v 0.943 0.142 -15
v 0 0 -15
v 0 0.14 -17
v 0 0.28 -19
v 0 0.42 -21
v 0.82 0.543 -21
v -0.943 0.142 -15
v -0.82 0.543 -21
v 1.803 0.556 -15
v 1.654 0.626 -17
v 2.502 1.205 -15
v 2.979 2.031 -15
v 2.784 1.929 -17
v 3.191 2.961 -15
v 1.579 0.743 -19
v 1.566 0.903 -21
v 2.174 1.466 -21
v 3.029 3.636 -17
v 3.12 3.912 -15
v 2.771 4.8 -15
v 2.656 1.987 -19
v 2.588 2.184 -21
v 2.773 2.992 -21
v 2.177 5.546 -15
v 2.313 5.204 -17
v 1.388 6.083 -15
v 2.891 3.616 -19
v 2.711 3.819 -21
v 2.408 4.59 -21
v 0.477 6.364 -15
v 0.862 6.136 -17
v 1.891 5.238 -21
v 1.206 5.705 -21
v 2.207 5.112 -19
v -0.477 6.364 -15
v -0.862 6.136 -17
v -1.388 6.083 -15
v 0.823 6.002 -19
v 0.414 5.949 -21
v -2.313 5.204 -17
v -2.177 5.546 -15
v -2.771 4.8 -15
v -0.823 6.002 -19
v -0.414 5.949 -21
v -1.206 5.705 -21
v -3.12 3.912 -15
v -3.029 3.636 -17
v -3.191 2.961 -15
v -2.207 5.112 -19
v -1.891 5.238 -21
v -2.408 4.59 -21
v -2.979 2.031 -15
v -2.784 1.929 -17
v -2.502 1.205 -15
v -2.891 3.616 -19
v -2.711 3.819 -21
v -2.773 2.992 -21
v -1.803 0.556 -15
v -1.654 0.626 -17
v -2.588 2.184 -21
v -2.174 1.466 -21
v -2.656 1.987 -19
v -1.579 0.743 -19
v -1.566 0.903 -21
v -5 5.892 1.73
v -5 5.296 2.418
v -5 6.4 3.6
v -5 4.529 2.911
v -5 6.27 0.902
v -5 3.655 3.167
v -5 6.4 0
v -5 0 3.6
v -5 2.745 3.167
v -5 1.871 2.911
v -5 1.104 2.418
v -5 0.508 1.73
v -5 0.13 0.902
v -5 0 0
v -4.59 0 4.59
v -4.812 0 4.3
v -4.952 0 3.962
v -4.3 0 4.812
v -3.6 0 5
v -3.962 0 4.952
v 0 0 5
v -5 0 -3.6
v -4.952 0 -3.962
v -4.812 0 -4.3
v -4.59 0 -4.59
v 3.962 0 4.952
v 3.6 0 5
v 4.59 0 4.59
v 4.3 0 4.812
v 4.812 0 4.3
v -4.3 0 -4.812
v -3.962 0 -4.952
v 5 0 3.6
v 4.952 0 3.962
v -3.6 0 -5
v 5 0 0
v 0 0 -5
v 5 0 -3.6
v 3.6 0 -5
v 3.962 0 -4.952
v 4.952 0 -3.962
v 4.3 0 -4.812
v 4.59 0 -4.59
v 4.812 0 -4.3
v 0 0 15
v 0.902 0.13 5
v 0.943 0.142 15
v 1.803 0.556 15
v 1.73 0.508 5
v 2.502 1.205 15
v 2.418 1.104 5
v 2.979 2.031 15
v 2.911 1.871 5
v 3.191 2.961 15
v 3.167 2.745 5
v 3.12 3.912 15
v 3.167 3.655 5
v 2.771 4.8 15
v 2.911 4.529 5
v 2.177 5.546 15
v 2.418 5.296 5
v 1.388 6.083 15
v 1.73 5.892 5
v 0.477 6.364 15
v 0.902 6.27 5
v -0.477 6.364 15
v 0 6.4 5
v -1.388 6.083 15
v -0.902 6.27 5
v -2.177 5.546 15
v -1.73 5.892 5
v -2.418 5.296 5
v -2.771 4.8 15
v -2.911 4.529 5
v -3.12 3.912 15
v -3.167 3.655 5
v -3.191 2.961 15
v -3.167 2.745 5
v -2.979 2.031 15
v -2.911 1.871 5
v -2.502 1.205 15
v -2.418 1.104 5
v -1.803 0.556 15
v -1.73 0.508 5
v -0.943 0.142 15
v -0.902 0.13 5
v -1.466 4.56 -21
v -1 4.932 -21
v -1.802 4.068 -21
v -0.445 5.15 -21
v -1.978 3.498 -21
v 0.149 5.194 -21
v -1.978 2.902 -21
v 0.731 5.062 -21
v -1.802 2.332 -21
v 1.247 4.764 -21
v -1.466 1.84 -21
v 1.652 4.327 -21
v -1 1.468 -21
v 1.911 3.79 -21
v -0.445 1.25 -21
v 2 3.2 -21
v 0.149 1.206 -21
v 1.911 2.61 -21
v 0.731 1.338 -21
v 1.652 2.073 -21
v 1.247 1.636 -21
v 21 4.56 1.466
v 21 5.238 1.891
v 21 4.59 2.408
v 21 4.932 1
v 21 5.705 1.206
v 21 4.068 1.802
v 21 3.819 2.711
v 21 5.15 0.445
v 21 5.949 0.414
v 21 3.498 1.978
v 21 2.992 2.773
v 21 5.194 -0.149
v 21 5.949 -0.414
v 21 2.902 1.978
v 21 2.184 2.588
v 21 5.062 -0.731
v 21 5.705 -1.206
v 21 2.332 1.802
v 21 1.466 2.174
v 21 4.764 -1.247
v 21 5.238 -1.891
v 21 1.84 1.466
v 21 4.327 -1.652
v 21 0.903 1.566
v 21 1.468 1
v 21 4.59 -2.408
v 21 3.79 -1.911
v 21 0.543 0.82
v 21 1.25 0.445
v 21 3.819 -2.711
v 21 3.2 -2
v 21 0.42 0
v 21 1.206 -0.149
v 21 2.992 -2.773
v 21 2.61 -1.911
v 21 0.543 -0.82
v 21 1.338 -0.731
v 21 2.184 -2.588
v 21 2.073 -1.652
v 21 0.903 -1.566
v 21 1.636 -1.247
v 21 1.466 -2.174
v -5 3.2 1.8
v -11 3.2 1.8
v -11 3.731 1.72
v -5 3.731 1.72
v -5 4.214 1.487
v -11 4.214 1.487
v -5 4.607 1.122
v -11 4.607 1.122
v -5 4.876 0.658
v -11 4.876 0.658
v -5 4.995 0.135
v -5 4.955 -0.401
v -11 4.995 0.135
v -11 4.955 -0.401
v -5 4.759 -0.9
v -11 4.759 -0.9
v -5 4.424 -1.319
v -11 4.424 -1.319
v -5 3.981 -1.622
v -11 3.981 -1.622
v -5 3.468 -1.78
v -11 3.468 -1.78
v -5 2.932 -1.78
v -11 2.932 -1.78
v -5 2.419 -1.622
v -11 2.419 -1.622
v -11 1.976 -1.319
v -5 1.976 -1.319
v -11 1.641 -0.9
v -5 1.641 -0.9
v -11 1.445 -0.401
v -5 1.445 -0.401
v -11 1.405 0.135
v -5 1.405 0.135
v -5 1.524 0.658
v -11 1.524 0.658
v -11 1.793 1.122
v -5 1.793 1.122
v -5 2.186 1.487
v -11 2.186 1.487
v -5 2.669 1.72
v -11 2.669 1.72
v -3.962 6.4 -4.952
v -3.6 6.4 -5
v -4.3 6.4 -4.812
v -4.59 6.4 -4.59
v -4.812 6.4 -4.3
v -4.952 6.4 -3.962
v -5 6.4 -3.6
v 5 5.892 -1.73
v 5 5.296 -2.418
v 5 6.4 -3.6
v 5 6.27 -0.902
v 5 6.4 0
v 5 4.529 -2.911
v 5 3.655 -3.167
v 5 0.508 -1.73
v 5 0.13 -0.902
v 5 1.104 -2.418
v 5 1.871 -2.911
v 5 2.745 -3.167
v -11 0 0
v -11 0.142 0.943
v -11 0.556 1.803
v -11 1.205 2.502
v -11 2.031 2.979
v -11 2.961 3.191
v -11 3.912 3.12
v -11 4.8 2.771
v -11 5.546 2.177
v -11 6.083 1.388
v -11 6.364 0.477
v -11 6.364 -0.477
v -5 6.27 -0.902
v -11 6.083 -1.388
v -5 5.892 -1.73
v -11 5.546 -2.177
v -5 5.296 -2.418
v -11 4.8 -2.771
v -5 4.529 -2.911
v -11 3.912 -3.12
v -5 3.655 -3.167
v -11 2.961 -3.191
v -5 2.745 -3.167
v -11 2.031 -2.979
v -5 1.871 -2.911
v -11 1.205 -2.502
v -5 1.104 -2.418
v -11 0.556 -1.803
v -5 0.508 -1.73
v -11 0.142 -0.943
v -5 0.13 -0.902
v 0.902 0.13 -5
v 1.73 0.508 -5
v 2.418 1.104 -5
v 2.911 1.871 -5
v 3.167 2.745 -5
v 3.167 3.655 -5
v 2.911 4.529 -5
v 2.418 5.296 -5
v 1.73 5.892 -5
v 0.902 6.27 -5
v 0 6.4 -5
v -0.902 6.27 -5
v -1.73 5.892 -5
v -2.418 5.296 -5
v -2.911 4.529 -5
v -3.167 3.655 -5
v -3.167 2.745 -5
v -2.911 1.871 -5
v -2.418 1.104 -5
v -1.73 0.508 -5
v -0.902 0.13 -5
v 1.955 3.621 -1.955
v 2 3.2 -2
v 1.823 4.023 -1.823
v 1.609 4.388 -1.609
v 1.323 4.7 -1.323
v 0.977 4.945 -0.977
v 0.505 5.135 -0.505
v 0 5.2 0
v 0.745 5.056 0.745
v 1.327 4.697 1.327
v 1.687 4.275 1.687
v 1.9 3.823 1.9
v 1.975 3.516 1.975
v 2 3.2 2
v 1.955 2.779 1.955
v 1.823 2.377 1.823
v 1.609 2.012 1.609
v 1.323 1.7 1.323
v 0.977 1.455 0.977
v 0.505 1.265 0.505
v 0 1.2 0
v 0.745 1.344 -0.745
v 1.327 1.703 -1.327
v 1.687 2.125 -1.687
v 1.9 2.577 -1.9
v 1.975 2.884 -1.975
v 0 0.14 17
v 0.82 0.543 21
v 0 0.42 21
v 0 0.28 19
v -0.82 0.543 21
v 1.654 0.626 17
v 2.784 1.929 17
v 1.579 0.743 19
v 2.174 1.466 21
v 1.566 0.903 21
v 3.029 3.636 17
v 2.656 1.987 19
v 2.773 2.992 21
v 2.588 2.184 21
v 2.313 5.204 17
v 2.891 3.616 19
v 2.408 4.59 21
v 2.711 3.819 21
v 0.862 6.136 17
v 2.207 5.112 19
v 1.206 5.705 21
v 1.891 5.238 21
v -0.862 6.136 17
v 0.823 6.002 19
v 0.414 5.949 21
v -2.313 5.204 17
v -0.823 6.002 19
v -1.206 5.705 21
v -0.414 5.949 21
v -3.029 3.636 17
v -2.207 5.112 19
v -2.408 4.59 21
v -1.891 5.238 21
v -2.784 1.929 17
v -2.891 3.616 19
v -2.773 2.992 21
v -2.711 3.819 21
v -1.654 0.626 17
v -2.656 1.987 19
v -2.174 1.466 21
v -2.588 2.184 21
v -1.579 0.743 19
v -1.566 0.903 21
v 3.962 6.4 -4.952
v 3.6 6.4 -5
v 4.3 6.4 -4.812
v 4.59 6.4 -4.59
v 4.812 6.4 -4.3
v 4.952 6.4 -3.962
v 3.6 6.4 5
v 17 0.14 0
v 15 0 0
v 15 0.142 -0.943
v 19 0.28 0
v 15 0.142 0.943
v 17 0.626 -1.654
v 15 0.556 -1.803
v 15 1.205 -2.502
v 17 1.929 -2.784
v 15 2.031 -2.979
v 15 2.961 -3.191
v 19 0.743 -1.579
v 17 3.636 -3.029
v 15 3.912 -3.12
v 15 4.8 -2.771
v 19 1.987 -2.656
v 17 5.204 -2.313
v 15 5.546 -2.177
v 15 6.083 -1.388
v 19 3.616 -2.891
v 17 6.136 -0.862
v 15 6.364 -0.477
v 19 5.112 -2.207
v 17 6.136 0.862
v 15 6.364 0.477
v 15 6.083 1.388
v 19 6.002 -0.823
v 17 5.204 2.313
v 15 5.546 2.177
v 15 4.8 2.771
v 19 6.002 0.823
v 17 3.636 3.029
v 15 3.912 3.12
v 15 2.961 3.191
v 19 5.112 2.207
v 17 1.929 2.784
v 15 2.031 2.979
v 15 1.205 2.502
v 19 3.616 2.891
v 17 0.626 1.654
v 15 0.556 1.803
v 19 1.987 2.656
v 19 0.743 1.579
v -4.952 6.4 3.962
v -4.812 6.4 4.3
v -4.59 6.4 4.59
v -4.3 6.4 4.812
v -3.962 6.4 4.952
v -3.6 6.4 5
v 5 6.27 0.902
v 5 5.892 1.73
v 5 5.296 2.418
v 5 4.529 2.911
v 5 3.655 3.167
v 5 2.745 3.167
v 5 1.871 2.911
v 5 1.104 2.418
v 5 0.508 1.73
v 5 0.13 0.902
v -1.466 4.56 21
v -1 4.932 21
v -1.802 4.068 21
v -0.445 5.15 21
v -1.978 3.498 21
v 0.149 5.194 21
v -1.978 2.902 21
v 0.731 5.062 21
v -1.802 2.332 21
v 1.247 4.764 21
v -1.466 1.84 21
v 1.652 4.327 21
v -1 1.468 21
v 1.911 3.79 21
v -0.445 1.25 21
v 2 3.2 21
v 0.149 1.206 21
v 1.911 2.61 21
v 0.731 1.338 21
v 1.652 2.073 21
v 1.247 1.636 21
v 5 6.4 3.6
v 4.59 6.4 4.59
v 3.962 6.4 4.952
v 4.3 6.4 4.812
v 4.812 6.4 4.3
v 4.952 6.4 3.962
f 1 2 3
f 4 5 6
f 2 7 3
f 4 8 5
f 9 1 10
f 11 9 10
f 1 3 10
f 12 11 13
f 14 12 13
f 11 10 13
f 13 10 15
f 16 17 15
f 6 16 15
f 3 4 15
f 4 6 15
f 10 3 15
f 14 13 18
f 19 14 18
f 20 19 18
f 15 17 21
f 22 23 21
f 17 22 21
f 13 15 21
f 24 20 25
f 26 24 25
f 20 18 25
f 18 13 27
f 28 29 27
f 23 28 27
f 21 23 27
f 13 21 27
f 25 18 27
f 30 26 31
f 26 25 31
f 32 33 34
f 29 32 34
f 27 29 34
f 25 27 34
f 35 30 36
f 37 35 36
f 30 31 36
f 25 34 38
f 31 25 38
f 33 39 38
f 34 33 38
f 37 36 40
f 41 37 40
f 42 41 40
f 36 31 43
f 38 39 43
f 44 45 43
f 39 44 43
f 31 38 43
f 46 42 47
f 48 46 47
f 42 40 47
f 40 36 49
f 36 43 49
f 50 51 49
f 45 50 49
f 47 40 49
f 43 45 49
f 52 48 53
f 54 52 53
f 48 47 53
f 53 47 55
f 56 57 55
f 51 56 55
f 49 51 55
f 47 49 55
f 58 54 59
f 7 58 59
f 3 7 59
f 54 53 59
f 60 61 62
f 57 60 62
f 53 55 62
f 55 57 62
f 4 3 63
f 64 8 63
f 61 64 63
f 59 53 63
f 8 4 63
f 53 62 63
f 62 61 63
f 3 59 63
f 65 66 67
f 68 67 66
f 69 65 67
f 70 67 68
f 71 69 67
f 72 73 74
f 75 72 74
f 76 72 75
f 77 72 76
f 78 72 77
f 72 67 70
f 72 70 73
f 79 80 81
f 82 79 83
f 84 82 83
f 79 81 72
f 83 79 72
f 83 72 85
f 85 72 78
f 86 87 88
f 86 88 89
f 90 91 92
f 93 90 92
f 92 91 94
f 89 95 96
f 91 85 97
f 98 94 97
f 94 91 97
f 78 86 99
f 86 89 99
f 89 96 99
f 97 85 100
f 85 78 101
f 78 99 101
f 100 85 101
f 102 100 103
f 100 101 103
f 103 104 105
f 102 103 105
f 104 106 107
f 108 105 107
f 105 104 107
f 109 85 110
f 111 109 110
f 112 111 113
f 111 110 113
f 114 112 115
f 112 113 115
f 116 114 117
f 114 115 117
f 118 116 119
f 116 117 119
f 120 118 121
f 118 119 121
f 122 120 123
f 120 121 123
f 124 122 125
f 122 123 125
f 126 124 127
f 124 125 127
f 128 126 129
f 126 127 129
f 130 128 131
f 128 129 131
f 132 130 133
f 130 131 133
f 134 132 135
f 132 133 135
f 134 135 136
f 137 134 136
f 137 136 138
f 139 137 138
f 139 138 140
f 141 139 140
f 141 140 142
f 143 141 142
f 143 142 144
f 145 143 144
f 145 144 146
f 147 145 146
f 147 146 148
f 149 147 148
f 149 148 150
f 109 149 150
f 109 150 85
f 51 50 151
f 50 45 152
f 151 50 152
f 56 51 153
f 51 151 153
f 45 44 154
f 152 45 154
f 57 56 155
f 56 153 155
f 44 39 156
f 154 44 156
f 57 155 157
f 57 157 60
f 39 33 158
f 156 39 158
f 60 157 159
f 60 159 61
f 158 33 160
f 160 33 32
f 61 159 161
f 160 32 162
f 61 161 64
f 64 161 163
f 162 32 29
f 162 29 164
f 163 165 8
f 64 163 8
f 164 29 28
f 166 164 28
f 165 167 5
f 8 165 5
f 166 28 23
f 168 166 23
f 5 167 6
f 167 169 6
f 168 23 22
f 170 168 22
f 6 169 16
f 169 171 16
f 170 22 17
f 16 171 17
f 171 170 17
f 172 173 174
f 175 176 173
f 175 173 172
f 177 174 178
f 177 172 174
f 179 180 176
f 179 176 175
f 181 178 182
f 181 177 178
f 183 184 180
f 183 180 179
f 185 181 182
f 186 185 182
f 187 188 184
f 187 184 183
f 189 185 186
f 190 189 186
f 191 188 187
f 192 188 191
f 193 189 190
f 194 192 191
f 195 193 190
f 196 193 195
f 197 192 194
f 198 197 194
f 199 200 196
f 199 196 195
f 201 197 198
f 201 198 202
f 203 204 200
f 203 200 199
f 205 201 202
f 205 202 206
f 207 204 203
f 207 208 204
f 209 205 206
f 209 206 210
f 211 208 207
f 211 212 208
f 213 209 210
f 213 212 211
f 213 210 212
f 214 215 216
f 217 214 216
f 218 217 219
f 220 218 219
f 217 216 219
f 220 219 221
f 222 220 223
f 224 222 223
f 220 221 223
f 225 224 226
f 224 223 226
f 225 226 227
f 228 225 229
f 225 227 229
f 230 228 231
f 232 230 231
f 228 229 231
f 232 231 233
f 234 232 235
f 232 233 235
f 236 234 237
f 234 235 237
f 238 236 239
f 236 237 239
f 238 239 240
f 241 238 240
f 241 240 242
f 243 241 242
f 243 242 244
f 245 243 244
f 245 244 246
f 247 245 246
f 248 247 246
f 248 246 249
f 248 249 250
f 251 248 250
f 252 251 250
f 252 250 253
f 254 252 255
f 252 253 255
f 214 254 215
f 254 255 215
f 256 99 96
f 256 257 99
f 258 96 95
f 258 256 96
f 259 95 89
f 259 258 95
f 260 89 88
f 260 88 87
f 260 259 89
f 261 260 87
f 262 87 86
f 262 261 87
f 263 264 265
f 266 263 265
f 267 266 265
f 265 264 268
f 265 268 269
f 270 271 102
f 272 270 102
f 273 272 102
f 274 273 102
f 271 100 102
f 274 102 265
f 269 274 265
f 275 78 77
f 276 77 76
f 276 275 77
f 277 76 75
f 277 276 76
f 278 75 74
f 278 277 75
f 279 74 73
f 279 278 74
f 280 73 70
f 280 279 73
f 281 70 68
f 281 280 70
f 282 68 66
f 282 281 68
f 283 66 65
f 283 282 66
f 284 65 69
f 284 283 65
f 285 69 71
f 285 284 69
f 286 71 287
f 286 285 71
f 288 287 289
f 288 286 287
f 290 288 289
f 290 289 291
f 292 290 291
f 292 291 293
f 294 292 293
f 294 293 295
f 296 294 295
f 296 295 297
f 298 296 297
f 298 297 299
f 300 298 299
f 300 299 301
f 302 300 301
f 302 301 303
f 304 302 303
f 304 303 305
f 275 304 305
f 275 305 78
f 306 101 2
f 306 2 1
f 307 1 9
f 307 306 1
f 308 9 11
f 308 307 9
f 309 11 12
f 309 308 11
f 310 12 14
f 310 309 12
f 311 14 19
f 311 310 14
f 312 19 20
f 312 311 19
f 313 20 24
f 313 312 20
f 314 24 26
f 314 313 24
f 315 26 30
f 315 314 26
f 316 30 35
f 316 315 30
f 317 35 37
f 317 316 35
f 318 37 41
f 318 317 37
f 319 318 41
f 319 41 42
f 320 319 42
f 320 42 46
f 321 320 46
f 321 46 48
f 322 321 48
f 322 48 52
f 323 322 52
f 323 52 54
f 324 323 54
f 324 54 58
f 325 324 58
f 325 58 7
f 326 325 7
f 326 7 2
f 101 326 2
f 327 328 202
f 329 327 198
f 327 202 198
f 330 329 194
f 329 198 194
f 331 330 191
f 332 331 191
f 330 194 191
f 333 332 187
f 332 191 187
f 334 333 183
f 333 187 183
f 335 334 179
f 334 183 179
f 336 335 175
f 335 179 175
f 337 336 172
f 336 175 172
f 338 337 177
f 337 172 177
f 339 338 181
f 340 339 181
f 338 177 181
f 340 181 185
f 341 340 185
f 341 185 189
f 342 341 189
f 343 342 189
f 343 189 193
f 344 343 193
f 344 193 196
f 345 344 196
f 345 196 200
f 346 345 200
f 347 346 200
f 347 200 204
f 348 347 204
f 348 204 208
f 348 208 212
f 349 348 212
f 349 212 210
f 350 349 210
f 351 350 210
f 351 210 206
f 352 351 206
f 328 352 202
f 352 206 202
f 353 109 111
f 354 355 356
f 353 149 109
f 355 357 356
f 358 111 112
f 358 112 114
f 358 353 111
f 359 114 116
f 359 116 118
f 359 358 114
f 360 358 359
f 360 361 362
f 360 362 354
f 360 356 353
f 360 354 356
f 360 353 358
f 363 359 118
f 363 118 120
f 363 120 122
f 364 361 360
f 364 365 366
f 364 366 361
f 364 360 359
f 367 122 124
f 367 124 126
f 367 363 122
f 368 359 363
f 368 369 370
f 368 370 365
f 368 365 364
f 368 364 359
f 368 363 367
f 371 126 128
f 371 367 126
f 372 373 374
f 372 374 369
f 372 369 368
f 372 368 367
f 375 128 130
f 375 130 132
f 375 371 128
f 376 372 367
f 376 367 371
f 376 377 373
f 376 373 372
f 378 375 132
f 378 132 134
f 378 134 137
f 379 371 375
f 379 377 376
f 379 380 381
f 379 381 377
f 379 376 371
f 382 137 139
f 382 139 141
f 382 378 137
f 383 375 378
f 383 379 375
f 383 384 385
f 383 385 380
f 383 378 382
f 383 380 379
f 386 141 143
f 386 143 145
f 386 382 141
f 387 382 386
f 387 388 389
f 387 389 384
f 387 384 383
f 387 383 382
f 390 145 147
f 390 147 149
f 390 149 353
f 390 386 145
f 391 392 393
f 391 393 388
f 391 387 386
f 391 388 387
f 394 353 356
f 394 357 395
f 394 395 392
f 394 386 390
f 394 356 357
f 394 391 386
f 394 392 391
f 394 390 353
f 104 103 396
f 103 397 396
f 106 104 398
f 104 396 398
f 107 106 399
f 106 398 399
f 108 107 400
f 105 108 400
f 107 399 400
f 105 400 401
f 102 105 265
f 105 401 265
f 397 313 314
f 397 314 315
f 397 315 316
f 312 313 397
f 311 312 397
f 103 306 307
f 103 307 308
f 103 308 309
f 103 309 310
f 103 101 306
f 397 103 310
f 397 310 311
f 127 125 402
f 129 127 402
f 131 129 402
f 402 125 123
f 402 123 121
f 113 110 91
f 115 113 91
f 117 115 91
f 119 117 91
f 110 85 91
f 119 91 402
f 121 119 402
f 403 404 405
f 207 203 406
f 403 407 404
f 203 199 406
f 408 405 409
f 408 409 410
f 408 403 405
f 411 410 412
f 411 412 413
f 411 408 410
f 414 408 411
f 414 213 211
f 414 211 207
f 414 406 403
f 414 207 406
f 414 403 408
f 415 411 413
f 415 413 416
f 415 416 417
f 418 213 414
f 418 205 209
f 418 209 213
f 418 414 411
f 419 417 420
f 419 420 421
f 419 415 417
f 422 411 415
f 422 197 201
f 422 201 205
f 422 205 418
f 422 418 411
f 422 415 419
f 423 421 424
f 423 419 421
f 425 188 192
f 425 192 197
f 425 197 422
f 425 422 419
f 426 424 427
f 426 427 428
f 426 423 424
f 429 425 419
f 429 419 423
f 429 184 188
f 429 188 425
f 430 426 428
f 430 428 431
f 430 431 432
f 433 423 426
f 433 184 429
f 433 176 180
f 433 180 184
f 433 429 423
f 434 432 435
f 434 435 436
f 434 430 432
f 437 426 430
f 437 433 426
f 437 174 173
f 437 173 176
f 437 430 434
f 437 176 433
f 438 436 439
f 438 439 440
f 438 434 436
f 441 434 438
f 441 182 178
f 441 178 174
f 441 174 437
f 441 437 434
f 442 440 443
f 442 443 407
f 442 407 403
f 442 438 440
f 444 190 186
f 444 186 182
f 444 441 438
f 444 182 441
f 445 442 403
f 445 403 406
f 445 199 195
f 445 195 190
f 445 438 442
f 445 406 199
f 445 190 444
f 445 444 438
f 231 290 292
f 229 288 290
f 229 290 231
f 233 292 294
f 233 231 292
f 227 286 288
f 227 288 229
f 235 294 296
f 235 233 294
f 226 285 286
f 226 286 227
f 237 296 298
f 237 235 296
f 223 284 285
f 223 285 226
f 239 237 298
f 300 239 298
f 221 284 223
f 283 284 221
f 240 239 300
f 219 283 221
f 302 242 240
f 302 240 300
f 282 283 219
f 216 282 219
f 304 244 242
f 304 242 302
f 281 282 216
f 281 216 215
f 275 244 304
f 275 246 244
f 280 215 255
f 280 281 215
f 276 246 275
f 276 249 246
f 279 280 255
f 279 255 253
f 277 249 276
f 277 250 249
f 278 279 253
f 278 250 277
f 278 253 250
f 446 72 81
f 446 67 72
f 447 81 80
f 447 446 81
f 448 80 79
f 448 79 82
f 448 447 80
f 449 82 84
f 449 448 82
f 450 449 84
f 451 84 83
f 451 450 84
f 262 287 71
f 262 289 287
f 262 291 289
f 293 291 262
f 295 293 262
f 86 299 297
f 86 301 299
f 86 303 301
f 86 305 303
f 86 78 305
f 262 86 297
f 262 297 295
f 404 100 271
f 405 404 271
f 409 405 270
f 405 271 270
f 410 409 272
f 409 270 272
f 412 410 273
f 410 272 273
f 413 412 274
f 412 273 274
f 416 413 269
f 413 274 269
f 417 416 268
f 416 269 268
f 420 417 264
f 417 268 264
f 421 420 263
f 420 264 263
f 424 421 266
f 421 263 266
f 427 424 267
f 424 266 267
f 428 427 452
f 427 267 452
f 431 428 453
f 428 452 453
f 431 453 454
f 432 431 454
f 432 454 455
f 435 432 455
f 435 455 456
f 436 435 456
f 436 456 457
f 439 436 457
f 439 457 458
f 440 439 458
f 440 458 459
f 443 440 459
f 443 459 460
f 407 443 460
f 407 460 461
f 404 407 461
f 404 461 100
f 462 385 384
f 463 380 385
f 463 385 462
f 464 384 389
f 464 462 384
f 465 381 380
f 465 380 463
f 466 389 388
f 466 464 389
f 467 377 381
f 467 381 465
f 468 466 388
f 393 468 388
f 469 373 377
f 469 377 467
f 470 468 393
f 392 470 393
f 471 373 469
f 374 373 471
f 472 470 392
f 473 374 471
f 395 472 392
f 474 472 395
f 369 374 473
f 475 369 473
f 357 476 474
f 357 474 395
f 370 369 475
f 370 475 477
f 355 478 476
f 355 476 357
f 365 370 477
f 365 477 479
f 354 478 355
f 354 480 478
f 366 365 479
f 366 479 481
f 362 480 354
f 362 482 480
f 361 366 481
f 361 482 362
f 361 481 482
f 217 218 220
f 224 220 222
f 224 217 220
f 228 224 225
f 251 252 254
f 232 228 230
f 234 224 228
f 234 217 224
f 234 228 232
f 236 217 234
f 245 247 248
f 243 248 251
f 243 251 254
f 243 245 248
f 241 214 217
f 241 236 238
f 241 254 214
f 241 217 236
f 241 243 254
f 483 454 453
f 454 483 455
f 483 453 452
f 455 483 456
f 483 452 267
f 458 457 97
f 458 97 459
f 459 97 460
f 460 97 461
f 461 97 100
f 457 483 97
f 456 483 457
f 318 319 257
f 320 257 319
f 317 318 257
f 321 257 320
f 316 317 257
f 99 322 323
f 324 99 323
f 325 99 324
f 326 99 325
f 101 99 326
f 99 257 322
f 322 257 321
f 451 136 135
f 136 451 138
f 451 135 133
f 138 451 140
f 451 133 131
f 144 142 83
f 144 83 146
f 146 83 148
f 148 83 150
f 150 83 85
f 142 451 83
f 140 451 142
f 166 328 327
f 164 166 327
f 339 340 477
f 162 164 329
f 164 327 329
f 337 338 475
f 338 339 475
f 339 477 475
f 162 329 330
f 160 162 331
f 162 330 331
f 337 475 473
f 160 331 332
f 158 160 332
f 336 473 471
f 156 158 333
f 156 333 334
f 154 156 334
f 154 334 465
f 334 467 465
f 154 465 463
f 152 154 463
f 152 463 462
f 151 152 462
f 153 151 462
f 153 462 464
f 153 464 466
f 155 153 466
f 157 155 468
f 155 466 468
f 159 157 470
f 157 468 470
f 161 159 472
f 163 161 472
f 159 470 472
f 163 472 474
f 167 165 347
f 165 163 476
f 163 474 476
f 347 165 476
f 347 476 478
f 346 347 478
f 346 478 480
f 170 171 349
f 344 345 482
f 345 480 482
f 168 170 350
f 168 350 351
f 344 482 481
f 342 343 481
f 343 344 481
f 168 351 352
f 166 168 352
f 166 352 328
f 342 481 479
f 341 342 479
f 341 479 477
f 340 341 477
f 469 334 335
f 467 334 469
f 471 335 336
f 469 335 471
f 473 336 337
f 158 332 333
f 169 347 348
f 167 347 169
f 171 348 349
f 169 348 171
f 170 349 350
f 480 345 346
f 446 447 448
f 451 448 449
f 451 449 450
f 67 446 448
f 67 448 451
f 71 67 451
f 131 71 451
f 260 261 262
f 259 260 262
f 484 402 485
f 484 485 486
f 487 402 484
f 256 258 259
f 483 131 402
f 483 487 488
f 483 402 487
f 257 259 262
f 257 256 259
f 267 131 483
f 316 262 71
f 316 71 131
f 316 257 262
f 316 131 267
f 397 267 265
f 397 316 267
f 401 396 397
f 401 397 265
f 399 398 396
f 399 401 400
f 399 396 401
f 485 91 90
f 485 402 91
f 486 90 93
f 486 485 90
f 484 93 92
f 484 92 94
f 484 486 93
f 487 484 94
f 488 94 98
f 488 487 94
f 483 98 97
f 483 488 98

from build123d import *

# Parameters (mm, degrees)
SKETCH1_W               = 10
SKETCH1_H               = 10
BOSS_EXTRUDE1_DEPTH     = 6.4
SKETCH2_R               = 3.2
BOSS_EXTRUDE2_DEPTH     = 10
SKETCH4_R               = 3.2
BOSS_EXTRUDE3_DEPTH     = 10
SKETCH8_R               = 3.2
BOSS_EXTRUDE4_DEPTH     = 6
BOSS_EXTRUDE4_TAPER     = 4
SKETCH10_R              = 3.2
BOSS_EXTRUDE5_DEPTH     = 6
BOSS_EXTRUDE5_TAPER     = 4
FILLET1_R               = 1.4
SKETCH11_R              = 2
CUT_EXTRUDE5_DEPTH      = 48.391560488
CUT_EXTRUDE6_REACH      = 36.029
CUT_EXTRUDE6_END_RADIUS = 2
SKETCH9_R               = 2
BOSS_EXTRUDE6_START     = 6
SKETCH12_R              = 3.2
SKETCH12_R_2            = 1.8
BOSS_EXTRUDE6_DEPTH     = 6


with BuildPart() as part:
    # Sketch1 → Boss-Extrude1 (new body)
    with BuildSketch(Plane(origin=(0, 0, 0), x_dir=(1, 0, 0), z_dir=(0, 1, 0))):
        Rectangle(SKETCH1_W, SKETCH1_H)
    extrude(amount=BOSS_EXTRUDE1_DEPTH)

    # Sketch2 → Boss-Extrude2 (add)
    with BuildSketch(Plane.XY.offset(5)):
        with Locations(Location((0, 3.2, 0), (0, 0, 270))):
            Circle(SKETCH2_R)
    boss_extrude2 = extrude(amount=BOSS_EXTRUDE2_DEPTH)

    # Sketch4 → Boss-Extrude3 (add)
    with BuildSketch(Plane(origin=(5, 0, 0), x_dir=(0, 0, -1), z_dir=(1, 0, 0))):
        with Locations(Location((0, 3.2, 0), (0, 0, 270))):
            Circle(SKETCH4_R)
    extrude(amount=BOSS_EXTRUDE3_DEPTH)

    # Sketch8 → Boss-Extrude4 (add)
    with BuildSketch(Plane(origin=(15, 0, 0), x_dir=(0, 0, -1), z_dir=(1, 0, 0))):
        with Locations(Location((0, 3.2, 0), (0, 0, 270))):
            Circle(SKETCH8_R)
    extrude(amount=BOSS_EXTRUDE4_DEPTH, taper=BOSS_EXTRUDE4_TAPER)

    # Sketch10 → Boss-Extrude5 (add)
    with BuildSketch(Plane.XY.offset(15)):
        with Locations(Location((0, 3.2, 0), (0, 0, 270))):
            Circle(SKETCH10_R)
    boss_extrude5 = extrude(amount=BOSS_EXTRUDE5_DEPTH, taper=BOSS_EXTRUDE5_TAPER)

    # Mirror2: Boss-Extrude2, Boss-Extrude5 across plane
    add(boss_extrude2.mirror(Plane.XY))
    add(boss_extrude5.mirror(Plane.XY))

    # Fillet1
    fillet1_edges = [part.edges().sort_by_distance(p)[0] for p in [
        (-5, 3.2, -5),
        (5, 3.2, -5),
        (5, 3.2, 5),
        (-5, 3.2, 5),
    ]]
    fillet(fillet1_edges, radius=FILLET1_R)

    # Sketch11 → Cut-Extrude5 (cut, through all)
    with BuildSketch(Plane.XY.offset(21)):
        with Locations((0, 3.2)):
            Circle(SKETCH11_R)
    extrude(amount=-CUT_EXTRUDE5_DEPTH, mode=Mode.SUBTRACT)

    # Cut-Extrude6: up to this cylinder (the profile starts outside it)
    cut_extrude6_end = Plane(origin=(0, 3.2, 0), z_dir=(0, 0, 1)) * Cylinder(CUT_EXTRUDE6_END_RADIUS, 77.058, mode=Mode.PRIVATE)
    # Sketch9 → Cut-Extrude6 (cut, up to the surface)
    with BuildSketch(Plane(origin=(21, 0, 0), x_dir=(0, 0, -1), z_dir=(1, 0, 0)), mode=Mode.PRIVATE) as cut_extrude6_sk1:
        with Locations((0, 3.2)):
            Circle(SKETCH9_R)
    cut_extrude6_tool1 = extrude(cut_extrude6_sk1.sketch, amount=-CUT_EXTRUDE6_REACH, mode=Mode.PRIVATE) - cut_extrude6_end
    add(cut_extrude6_tool1.solids().sort_by_distance((21, 3.2, 0))[0], mode=Mode.SUBTRACT)

    # Sketch12 → Boss-Extrude6 (add)
    with BuildSketch(Plane.ZY.offset(5).offset(BOSS_EXTRUDE6_START)):
        with Locations(Location((0, 3.2, 0), (0, 0, 270))):
            Circle(SKETCH12_R)
        with Locations((0, 3.2)):
            Circle(SKETCH12_R_2, mode=Mode.SUBTRACT)
    extrude(amount=-BOSS_EXTRUDE6_DEPTH)


solid = part.part
